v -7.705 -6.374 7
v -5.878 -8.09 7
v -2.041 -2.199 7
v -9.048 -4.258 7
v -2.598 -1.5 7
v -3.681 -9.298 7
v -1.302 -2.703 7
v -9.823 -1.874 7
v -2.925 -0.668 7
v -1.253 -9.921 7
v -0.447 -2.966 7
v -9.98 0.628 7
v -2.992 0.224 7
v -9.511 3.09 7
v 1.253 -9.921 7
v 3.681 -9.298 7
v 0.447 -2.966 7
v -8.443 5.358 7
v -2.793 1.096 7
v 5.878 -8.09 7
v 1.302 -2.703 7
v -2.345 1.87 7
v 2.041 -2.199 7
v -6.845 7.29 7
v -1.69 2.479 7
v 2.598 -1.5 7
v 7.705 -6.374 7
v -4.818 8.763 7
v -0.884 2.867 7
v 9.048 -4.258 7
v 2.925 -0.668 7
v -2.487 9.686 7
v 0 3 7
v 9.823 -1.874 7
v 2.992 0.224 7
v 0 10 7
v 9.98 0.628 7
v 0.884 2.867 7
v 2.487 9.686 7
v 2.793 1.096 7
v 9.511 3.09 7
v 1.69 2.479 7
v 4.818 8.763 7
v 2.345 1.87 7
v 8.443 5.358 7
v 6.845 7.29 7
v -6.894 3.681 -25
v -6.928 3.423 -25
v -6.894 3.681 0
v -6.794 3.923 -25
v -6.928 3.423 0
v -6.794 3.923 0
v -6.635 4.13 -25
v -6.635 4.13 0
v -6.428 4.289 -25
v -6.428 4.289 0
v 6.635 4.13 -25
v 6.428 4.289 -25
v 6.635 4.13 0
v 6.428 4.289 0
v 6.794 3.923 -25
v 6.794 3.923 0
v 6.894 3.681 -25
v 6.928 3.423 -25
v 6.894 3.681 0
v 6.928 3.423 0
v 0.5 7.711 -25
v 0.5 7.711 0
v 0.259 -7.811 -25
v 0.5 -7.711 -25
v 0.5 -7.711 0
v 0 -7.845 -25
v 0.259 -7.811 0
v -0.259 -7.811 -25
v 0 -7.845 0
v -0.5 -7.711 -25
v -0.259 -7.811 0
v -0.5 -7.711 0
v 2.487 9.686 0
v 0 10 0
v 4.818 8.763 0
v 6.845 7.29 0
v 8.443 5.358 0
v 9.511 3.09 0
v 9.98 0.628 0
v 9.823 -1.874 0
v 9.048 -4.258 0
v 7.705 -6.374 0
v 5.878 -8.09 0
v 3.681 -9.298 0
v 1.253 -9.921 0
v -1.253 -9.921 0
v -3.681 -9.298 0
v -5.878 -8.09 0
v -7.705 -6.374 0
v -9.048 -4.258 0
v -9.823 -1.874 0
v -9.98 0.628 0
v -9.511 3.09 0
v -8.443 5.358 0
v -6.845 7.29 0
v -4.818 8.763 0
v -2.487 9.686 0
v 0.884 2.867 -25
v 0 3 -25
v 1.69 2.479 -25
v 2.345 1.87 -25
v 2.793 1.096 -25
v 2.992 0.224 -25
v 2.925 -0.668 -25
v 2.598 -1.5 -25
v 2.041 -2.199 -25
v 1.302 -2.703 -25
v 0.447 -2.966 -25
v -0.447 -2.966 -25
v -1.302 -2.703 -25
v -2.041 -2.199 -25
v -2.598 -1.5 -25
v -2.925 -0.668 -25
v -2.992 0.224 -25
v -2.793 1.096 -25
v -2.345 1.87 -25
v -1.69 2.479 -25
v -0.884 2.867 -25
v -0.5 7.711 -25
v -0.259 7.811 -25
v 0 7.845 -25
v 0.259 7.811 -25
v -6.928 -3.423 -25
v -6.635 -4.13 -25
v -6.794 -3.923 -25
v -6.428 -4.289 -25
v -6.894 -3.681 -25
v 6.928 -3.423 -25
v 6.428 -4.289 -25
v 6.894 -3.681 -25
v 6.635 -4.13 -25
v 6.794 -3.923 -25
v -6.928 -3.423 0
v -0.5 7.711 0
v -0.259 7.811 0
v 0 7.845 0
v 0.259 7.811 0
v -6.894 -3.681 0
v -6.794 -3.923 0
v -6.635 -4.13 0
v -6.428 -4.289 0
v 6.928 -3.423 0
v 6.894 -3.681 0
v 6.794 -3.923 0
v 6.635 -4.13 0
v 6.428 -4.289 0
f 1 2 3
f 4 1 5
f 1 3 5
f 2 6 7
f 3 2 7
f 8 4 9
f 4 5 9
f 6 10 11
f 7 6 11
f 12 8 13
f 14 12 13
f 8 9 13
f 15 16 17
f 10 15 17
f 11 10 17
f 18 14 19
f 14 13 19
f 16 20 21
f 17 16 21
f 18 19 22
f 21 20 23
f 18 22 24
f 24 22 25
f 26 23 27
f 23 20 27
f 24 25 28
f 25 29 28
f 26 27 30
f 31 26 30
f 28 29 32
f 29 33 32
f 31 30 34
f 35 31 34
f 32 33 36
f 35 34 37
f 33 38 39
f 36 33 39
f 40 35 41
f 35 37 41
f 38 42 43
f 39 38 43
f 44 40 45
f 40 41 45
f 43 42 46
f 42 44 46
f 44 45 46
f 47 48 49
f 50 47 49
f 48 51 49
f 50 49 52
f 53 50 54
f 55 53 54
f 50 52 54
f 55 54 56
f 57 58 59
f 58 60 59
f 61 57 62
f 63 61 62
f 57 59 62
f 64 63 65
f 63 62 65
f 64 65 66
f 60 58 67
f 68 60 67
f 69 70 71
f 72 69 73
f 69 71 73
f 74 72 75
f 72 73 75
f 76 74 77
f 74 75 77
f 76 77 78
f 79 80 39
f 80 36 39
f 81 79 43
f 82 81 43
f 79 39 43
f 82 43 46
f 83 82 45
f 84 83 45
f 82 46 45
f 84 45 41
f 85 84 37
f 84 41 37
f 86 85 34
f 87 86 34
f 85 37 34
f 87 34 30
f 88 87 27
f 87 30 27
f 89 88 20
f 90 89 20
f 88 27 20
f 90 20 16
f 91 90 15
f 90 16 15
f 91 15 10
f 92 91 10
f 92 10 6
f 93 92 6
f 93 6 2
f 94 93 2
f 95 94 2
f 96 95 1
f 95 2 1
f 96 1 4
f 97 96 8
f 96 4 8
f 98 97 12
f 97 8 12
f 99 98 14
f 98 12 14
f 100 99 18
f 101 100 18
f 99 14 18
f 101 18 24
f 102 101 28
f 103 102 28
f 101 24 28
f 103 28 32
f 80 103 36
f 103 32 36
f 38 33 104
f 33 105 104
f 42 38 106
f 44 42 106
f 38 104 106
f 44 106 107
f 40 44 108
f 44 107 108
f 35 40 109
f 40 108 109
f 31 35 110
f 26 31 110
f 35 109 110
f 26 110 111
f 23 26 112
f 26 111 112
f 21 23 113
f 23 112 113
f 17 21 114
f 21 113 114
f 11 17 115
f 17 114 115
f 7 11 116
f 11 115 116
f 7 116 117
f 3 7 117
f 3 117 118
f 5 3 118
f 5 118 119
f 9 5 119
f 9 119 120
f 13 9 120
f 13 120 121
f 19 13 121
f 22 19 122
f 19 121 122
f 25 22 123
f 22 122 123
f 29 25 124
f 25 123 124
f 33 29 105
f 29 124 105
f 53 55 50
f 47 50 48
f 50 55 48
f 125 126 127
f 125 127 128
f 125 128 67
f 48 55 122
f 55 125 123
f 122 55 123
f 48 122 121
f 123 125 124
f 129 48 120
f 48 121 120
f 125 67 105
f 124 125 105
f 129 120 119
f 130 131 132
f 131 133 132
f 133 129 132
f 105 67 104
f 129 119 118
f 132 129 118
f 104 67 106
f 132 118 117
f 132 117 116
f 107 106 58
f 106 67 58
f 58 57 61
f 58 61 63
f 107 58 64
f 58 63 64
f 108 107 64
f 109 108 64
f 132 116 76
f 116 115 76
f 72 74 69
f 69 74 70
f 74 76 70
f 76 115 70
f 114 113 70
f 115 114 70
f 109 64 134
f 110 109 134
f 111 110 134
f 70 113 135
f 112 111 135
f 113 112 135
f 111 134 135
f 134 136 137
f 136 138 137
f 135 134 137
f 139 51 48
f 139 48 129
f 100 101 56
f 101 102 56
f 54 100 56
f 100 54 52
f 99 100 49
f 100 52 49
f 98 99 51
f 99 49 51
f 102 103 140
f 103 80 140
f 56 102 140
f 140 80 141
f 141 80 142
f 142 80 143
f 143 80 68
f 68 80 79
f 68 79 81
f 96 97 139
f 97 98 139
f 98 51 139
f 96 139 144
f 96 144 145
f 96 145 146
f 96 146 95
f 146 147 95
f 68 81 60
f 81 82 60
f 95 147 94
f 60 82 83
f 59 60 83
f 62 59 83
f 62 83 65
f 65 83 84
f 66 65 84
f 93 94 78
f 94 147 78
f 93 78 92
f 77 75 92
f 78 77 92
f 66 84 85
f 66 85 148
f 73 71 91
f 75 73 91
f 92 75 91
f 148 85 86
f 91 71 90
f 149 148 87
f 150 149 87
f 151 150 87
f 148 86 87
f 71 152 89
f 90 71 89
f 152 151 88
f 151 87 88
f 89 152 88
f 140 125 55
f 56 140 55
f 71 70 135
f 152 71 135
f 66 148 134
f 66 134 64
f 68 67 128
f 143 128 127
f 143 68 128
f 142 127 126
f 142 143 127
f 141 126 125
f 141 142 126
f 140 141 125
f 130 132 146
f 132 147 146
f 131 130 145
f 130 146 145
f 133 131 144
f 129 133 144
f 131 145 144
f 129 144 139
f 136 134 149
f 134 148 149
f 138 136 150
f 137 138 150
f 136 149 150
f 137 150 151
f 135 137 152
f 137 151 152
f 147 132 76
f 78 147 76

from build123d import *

# Parameters (mm, degrees)
CUT_EXTRUDE1_DEPTH = 25
FILLET1_R          = 1


with BuildPart() as part:
    # Sketch2 → Revolve1 (revolve)
    with BuildSketch(Plane(origin=(0, 0, 0), x_dir=(0, 0, -1), z_dir=(1, 0, 0))):
        Polygon((-7, 3), (25, 3), (25, 8), (0, 8), (0, 10), (-7, 10), align=None)
    revolve(axis=Axis((0, 0, 0), (0, 0, -1)))

    # Sketch3 → Cut-Extrude1 (cut)
    with BuildSketch(Plane(origin=(0, 0, -25), x_dir=(-1, 0, 0), z_dir=(0, 0, -1))):
        with BuildLine():
            ThreePointArc((0, 8), (-4, 6.92820323), (-6.92820323, 4))
            Line((-6.92820323, 4), (0, 8))
        make_face()
        with BuildLine():
            ThreePointArc((-6.92820323, 4), (-8, 0), (-6.92820323, -4))
            Line((-6.92820323, -4), (-6.92820323, 4))
        make_face()
        with BuildLine():
            ThreePointArc((-6.92820323, -4), (-4, -6.92820323), (0, -8))
            Line((0, -8), (-6.92820323, -4))
        make_face()
        with BuildLine():
            Line((6.92820323, -4), (0, -8))
            ThreePointArc((0, -8), (4, -6.92820323), (6.92820323, -4))
        make_face()
        with BuildLine():
            Line((6.92820323, 4), (6.92820323, -4))
            ThreePointArc((6.92820323, -4), (7.72740661, -2.070552361), (8, 0))
            ThreePointArc((8, 0), (7.72740661, 2.070552361), (6.92820323, 4))
        make_face()
        with BuildLine():
            Line((0, 8), (6.92820323, 4))
            ThreePointArc((6.92820323, 4), (4, 6.92820323), (0, 8))
        make_face()
    extrude(amount=-CUT_EXTRUDE1_DEPTH, mode=Mode.SUBTRACT)

    # Fillet1
    fillet1_edges = [part.edges().sort_by_distance(p)[0] for p in [
        (0, 8, -12.5),
        (6.92820323, 4, -12.5),
        (6.92820323, -4, -12.5),
        (0, -8, -12.5),
        (-6.92820323, -4, -12.5),
        (-6.92820323, 4, -12.5),
    ]]
    fillet(fillet1_edges, radius=FILLET1_R)


solid = part.part
